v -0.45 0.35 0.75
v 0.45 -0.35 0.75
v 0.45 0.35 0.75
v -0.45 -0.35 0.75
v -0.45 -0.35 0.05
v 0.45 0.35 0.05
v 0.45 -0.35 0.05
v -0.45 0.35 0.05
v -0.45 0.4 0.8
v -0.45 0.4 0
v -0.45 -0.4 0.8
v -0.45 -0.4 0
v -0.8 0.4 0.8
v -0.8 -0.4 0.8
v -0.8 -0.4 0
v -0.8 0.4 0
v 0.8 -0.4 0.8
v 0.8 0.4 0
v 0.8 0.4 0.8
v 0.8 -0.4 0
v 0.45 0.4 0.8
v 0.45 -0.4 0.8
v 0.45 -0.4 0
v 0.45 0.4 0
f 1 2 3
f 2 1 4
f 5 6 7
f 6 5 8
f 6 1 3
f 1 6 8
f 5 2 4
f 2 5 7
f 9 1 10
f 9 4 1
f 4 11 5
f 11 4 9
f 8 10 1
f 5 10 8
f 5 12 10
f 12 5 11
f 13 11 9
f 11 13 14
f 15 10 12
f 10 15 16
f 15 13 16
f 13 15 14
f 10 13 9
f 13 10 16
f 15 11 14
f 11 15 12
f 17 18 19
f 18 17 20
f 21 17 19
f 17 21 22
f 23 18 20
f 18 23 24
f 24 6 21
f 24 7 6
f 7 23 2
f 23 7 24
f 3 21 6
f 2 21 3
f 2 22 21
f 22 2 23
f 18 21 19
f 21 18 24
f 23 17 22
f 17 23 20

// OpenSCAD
// file: proto/chip-c.scad
/*
OpenSCAD Model:  chip capacitor

  L  - body length
  T  - pad length
  W  - width
  H  - height
  padcolor - color of metal leads
  bodycolor - color of body
  simple - 0 = realistic model, 1 = simplified model
*/

module chip_c(
	L=2.00,
	T=0.50,
	W=1.25,
	H=1.20,
	padcolor=[0.9,0.9,0.9],
	bodycolor=[0.722,0.541,0.0],
	simple=1
) {

	module chippad() {
		if (simple) {
			color(padcolor)cube([T,W,H],center=true);
		} else {
			color(padcolor) union () {
				cube([T-0.1,W-0.1,H    ],center=true);
				cube([T-0.1,W    ,H-0.1],center=true);
				cube([T    ,W-0.1,H-0.1],center=true);
				translate([-T/2+0.05,-W/2+0.05,0]) cylinder(r=0.05,h=H-0.1,$fn=30,center=true);
				translate([T/2-0.05,-W/2+0.05,0]) cylinder(r=0.05,h=H-0.1,$fn=30,center=true);
				translate([-T/2+0.05,W/2-0.05,0]) cylinder(r=0.05,h=H-0.1,$fn=30,center=true);
				translate([T/2-0.05,W/2-0.05,0]) cylinder(r=0.05,h=H-0.1,$fn=30,center=true);
				translate([-T/2+0.05,0,H/2-0.05]) rotate(90,[1,0,0])cylinder(r=0.05,h=W-0.1,$fn=30,center=true);
				translate([T/2-0.05,0,H/2-0.05]) rotate(90,[1,0,0])cylinder(r=0.05,h=W-0.1,$fn=30,center=true);
				translate([-T/2+0.05,0,-H/2+0.05]) rotate(90,[1,0,0])cylinder(r=0.05,h=W-0.1,$fn=30,center=true);
				translate([T/2-0.05,0,-H/2+0.05]) rotate(90,[1,0,0])cylinder(r=0.05,h=W-0.1,$fn=30,center=true);
				translate([0,-W/2+0.05,H/2-0.05]) rotate(90,[0,1,0])cylinder(r=0.05,h=T-0.1,$fn=30,center=true);
				translate([0,W/2-0.05,H/2-0.05]) rotate(90,[0,1,0])cylinder(r=0.05,h=T-0.1,$fn=30,center=true);
				translate([0,-W/2+0.05,-H/2+0.05]) rotate(90,[0,1,0])cylinder(r=0.05,h=T-0.1,$fn=30,center=true);
				translate([0,W/2-0.05,-H/2+0.05]) rotate(90,[0,1,0])cylinder(r=0.05,h=T-0.1,$fn=30,center=true);
				translate([-T/2+0.05,-W/2+0.05,-H/2+0.05]) sphere(r=0.05, $fn=30);
				translate([-T/2+0.05,-W/2+0.05,H/2-0.05]) sphere(r=0.05, $fn=30);
				translate([T/2-0.05,-W/2+0.05,-H/2+0.05]) sphere(r=0.05, $fn=30);
				translate([T/2-0.05,-W/2+0.05,H/2-0.05]) sphere(r=0.05, $fn=30);
				translate([-T/2+0.05,W/2-0.05,-H/2+0.05]) sphere(r=0.05, $fn=30);
				translate([-T/2+0.05,W/2-0.05,H/2-0.05]) sphere(r=0.05, $fn=30);
				translate([T/2-0.05,W/2-0.05,-H/2+0.05]) sphere(r=0.05, $fn=30);
				translate([T/2-0.05,W/2-0.05,H/2-0.05]) sphere(r=0.05, $fn=30);
			}
		}
	}
	color(bodycolor) translate([0,0,H/2.]) cube([L-2*T+0.1,W-0.1,H-0.1],center=true);
	translate ([-L/2.+T/2.,0,H/2.]) chippad();
	translate ([L/2.-T/2.,0,H/2.]) chippad();
}
// main file
include<proto/chip-c.scad>

chip_c (
	L=1.6,
	T=0.35,
	W=0.8,
	H=0.8
);
